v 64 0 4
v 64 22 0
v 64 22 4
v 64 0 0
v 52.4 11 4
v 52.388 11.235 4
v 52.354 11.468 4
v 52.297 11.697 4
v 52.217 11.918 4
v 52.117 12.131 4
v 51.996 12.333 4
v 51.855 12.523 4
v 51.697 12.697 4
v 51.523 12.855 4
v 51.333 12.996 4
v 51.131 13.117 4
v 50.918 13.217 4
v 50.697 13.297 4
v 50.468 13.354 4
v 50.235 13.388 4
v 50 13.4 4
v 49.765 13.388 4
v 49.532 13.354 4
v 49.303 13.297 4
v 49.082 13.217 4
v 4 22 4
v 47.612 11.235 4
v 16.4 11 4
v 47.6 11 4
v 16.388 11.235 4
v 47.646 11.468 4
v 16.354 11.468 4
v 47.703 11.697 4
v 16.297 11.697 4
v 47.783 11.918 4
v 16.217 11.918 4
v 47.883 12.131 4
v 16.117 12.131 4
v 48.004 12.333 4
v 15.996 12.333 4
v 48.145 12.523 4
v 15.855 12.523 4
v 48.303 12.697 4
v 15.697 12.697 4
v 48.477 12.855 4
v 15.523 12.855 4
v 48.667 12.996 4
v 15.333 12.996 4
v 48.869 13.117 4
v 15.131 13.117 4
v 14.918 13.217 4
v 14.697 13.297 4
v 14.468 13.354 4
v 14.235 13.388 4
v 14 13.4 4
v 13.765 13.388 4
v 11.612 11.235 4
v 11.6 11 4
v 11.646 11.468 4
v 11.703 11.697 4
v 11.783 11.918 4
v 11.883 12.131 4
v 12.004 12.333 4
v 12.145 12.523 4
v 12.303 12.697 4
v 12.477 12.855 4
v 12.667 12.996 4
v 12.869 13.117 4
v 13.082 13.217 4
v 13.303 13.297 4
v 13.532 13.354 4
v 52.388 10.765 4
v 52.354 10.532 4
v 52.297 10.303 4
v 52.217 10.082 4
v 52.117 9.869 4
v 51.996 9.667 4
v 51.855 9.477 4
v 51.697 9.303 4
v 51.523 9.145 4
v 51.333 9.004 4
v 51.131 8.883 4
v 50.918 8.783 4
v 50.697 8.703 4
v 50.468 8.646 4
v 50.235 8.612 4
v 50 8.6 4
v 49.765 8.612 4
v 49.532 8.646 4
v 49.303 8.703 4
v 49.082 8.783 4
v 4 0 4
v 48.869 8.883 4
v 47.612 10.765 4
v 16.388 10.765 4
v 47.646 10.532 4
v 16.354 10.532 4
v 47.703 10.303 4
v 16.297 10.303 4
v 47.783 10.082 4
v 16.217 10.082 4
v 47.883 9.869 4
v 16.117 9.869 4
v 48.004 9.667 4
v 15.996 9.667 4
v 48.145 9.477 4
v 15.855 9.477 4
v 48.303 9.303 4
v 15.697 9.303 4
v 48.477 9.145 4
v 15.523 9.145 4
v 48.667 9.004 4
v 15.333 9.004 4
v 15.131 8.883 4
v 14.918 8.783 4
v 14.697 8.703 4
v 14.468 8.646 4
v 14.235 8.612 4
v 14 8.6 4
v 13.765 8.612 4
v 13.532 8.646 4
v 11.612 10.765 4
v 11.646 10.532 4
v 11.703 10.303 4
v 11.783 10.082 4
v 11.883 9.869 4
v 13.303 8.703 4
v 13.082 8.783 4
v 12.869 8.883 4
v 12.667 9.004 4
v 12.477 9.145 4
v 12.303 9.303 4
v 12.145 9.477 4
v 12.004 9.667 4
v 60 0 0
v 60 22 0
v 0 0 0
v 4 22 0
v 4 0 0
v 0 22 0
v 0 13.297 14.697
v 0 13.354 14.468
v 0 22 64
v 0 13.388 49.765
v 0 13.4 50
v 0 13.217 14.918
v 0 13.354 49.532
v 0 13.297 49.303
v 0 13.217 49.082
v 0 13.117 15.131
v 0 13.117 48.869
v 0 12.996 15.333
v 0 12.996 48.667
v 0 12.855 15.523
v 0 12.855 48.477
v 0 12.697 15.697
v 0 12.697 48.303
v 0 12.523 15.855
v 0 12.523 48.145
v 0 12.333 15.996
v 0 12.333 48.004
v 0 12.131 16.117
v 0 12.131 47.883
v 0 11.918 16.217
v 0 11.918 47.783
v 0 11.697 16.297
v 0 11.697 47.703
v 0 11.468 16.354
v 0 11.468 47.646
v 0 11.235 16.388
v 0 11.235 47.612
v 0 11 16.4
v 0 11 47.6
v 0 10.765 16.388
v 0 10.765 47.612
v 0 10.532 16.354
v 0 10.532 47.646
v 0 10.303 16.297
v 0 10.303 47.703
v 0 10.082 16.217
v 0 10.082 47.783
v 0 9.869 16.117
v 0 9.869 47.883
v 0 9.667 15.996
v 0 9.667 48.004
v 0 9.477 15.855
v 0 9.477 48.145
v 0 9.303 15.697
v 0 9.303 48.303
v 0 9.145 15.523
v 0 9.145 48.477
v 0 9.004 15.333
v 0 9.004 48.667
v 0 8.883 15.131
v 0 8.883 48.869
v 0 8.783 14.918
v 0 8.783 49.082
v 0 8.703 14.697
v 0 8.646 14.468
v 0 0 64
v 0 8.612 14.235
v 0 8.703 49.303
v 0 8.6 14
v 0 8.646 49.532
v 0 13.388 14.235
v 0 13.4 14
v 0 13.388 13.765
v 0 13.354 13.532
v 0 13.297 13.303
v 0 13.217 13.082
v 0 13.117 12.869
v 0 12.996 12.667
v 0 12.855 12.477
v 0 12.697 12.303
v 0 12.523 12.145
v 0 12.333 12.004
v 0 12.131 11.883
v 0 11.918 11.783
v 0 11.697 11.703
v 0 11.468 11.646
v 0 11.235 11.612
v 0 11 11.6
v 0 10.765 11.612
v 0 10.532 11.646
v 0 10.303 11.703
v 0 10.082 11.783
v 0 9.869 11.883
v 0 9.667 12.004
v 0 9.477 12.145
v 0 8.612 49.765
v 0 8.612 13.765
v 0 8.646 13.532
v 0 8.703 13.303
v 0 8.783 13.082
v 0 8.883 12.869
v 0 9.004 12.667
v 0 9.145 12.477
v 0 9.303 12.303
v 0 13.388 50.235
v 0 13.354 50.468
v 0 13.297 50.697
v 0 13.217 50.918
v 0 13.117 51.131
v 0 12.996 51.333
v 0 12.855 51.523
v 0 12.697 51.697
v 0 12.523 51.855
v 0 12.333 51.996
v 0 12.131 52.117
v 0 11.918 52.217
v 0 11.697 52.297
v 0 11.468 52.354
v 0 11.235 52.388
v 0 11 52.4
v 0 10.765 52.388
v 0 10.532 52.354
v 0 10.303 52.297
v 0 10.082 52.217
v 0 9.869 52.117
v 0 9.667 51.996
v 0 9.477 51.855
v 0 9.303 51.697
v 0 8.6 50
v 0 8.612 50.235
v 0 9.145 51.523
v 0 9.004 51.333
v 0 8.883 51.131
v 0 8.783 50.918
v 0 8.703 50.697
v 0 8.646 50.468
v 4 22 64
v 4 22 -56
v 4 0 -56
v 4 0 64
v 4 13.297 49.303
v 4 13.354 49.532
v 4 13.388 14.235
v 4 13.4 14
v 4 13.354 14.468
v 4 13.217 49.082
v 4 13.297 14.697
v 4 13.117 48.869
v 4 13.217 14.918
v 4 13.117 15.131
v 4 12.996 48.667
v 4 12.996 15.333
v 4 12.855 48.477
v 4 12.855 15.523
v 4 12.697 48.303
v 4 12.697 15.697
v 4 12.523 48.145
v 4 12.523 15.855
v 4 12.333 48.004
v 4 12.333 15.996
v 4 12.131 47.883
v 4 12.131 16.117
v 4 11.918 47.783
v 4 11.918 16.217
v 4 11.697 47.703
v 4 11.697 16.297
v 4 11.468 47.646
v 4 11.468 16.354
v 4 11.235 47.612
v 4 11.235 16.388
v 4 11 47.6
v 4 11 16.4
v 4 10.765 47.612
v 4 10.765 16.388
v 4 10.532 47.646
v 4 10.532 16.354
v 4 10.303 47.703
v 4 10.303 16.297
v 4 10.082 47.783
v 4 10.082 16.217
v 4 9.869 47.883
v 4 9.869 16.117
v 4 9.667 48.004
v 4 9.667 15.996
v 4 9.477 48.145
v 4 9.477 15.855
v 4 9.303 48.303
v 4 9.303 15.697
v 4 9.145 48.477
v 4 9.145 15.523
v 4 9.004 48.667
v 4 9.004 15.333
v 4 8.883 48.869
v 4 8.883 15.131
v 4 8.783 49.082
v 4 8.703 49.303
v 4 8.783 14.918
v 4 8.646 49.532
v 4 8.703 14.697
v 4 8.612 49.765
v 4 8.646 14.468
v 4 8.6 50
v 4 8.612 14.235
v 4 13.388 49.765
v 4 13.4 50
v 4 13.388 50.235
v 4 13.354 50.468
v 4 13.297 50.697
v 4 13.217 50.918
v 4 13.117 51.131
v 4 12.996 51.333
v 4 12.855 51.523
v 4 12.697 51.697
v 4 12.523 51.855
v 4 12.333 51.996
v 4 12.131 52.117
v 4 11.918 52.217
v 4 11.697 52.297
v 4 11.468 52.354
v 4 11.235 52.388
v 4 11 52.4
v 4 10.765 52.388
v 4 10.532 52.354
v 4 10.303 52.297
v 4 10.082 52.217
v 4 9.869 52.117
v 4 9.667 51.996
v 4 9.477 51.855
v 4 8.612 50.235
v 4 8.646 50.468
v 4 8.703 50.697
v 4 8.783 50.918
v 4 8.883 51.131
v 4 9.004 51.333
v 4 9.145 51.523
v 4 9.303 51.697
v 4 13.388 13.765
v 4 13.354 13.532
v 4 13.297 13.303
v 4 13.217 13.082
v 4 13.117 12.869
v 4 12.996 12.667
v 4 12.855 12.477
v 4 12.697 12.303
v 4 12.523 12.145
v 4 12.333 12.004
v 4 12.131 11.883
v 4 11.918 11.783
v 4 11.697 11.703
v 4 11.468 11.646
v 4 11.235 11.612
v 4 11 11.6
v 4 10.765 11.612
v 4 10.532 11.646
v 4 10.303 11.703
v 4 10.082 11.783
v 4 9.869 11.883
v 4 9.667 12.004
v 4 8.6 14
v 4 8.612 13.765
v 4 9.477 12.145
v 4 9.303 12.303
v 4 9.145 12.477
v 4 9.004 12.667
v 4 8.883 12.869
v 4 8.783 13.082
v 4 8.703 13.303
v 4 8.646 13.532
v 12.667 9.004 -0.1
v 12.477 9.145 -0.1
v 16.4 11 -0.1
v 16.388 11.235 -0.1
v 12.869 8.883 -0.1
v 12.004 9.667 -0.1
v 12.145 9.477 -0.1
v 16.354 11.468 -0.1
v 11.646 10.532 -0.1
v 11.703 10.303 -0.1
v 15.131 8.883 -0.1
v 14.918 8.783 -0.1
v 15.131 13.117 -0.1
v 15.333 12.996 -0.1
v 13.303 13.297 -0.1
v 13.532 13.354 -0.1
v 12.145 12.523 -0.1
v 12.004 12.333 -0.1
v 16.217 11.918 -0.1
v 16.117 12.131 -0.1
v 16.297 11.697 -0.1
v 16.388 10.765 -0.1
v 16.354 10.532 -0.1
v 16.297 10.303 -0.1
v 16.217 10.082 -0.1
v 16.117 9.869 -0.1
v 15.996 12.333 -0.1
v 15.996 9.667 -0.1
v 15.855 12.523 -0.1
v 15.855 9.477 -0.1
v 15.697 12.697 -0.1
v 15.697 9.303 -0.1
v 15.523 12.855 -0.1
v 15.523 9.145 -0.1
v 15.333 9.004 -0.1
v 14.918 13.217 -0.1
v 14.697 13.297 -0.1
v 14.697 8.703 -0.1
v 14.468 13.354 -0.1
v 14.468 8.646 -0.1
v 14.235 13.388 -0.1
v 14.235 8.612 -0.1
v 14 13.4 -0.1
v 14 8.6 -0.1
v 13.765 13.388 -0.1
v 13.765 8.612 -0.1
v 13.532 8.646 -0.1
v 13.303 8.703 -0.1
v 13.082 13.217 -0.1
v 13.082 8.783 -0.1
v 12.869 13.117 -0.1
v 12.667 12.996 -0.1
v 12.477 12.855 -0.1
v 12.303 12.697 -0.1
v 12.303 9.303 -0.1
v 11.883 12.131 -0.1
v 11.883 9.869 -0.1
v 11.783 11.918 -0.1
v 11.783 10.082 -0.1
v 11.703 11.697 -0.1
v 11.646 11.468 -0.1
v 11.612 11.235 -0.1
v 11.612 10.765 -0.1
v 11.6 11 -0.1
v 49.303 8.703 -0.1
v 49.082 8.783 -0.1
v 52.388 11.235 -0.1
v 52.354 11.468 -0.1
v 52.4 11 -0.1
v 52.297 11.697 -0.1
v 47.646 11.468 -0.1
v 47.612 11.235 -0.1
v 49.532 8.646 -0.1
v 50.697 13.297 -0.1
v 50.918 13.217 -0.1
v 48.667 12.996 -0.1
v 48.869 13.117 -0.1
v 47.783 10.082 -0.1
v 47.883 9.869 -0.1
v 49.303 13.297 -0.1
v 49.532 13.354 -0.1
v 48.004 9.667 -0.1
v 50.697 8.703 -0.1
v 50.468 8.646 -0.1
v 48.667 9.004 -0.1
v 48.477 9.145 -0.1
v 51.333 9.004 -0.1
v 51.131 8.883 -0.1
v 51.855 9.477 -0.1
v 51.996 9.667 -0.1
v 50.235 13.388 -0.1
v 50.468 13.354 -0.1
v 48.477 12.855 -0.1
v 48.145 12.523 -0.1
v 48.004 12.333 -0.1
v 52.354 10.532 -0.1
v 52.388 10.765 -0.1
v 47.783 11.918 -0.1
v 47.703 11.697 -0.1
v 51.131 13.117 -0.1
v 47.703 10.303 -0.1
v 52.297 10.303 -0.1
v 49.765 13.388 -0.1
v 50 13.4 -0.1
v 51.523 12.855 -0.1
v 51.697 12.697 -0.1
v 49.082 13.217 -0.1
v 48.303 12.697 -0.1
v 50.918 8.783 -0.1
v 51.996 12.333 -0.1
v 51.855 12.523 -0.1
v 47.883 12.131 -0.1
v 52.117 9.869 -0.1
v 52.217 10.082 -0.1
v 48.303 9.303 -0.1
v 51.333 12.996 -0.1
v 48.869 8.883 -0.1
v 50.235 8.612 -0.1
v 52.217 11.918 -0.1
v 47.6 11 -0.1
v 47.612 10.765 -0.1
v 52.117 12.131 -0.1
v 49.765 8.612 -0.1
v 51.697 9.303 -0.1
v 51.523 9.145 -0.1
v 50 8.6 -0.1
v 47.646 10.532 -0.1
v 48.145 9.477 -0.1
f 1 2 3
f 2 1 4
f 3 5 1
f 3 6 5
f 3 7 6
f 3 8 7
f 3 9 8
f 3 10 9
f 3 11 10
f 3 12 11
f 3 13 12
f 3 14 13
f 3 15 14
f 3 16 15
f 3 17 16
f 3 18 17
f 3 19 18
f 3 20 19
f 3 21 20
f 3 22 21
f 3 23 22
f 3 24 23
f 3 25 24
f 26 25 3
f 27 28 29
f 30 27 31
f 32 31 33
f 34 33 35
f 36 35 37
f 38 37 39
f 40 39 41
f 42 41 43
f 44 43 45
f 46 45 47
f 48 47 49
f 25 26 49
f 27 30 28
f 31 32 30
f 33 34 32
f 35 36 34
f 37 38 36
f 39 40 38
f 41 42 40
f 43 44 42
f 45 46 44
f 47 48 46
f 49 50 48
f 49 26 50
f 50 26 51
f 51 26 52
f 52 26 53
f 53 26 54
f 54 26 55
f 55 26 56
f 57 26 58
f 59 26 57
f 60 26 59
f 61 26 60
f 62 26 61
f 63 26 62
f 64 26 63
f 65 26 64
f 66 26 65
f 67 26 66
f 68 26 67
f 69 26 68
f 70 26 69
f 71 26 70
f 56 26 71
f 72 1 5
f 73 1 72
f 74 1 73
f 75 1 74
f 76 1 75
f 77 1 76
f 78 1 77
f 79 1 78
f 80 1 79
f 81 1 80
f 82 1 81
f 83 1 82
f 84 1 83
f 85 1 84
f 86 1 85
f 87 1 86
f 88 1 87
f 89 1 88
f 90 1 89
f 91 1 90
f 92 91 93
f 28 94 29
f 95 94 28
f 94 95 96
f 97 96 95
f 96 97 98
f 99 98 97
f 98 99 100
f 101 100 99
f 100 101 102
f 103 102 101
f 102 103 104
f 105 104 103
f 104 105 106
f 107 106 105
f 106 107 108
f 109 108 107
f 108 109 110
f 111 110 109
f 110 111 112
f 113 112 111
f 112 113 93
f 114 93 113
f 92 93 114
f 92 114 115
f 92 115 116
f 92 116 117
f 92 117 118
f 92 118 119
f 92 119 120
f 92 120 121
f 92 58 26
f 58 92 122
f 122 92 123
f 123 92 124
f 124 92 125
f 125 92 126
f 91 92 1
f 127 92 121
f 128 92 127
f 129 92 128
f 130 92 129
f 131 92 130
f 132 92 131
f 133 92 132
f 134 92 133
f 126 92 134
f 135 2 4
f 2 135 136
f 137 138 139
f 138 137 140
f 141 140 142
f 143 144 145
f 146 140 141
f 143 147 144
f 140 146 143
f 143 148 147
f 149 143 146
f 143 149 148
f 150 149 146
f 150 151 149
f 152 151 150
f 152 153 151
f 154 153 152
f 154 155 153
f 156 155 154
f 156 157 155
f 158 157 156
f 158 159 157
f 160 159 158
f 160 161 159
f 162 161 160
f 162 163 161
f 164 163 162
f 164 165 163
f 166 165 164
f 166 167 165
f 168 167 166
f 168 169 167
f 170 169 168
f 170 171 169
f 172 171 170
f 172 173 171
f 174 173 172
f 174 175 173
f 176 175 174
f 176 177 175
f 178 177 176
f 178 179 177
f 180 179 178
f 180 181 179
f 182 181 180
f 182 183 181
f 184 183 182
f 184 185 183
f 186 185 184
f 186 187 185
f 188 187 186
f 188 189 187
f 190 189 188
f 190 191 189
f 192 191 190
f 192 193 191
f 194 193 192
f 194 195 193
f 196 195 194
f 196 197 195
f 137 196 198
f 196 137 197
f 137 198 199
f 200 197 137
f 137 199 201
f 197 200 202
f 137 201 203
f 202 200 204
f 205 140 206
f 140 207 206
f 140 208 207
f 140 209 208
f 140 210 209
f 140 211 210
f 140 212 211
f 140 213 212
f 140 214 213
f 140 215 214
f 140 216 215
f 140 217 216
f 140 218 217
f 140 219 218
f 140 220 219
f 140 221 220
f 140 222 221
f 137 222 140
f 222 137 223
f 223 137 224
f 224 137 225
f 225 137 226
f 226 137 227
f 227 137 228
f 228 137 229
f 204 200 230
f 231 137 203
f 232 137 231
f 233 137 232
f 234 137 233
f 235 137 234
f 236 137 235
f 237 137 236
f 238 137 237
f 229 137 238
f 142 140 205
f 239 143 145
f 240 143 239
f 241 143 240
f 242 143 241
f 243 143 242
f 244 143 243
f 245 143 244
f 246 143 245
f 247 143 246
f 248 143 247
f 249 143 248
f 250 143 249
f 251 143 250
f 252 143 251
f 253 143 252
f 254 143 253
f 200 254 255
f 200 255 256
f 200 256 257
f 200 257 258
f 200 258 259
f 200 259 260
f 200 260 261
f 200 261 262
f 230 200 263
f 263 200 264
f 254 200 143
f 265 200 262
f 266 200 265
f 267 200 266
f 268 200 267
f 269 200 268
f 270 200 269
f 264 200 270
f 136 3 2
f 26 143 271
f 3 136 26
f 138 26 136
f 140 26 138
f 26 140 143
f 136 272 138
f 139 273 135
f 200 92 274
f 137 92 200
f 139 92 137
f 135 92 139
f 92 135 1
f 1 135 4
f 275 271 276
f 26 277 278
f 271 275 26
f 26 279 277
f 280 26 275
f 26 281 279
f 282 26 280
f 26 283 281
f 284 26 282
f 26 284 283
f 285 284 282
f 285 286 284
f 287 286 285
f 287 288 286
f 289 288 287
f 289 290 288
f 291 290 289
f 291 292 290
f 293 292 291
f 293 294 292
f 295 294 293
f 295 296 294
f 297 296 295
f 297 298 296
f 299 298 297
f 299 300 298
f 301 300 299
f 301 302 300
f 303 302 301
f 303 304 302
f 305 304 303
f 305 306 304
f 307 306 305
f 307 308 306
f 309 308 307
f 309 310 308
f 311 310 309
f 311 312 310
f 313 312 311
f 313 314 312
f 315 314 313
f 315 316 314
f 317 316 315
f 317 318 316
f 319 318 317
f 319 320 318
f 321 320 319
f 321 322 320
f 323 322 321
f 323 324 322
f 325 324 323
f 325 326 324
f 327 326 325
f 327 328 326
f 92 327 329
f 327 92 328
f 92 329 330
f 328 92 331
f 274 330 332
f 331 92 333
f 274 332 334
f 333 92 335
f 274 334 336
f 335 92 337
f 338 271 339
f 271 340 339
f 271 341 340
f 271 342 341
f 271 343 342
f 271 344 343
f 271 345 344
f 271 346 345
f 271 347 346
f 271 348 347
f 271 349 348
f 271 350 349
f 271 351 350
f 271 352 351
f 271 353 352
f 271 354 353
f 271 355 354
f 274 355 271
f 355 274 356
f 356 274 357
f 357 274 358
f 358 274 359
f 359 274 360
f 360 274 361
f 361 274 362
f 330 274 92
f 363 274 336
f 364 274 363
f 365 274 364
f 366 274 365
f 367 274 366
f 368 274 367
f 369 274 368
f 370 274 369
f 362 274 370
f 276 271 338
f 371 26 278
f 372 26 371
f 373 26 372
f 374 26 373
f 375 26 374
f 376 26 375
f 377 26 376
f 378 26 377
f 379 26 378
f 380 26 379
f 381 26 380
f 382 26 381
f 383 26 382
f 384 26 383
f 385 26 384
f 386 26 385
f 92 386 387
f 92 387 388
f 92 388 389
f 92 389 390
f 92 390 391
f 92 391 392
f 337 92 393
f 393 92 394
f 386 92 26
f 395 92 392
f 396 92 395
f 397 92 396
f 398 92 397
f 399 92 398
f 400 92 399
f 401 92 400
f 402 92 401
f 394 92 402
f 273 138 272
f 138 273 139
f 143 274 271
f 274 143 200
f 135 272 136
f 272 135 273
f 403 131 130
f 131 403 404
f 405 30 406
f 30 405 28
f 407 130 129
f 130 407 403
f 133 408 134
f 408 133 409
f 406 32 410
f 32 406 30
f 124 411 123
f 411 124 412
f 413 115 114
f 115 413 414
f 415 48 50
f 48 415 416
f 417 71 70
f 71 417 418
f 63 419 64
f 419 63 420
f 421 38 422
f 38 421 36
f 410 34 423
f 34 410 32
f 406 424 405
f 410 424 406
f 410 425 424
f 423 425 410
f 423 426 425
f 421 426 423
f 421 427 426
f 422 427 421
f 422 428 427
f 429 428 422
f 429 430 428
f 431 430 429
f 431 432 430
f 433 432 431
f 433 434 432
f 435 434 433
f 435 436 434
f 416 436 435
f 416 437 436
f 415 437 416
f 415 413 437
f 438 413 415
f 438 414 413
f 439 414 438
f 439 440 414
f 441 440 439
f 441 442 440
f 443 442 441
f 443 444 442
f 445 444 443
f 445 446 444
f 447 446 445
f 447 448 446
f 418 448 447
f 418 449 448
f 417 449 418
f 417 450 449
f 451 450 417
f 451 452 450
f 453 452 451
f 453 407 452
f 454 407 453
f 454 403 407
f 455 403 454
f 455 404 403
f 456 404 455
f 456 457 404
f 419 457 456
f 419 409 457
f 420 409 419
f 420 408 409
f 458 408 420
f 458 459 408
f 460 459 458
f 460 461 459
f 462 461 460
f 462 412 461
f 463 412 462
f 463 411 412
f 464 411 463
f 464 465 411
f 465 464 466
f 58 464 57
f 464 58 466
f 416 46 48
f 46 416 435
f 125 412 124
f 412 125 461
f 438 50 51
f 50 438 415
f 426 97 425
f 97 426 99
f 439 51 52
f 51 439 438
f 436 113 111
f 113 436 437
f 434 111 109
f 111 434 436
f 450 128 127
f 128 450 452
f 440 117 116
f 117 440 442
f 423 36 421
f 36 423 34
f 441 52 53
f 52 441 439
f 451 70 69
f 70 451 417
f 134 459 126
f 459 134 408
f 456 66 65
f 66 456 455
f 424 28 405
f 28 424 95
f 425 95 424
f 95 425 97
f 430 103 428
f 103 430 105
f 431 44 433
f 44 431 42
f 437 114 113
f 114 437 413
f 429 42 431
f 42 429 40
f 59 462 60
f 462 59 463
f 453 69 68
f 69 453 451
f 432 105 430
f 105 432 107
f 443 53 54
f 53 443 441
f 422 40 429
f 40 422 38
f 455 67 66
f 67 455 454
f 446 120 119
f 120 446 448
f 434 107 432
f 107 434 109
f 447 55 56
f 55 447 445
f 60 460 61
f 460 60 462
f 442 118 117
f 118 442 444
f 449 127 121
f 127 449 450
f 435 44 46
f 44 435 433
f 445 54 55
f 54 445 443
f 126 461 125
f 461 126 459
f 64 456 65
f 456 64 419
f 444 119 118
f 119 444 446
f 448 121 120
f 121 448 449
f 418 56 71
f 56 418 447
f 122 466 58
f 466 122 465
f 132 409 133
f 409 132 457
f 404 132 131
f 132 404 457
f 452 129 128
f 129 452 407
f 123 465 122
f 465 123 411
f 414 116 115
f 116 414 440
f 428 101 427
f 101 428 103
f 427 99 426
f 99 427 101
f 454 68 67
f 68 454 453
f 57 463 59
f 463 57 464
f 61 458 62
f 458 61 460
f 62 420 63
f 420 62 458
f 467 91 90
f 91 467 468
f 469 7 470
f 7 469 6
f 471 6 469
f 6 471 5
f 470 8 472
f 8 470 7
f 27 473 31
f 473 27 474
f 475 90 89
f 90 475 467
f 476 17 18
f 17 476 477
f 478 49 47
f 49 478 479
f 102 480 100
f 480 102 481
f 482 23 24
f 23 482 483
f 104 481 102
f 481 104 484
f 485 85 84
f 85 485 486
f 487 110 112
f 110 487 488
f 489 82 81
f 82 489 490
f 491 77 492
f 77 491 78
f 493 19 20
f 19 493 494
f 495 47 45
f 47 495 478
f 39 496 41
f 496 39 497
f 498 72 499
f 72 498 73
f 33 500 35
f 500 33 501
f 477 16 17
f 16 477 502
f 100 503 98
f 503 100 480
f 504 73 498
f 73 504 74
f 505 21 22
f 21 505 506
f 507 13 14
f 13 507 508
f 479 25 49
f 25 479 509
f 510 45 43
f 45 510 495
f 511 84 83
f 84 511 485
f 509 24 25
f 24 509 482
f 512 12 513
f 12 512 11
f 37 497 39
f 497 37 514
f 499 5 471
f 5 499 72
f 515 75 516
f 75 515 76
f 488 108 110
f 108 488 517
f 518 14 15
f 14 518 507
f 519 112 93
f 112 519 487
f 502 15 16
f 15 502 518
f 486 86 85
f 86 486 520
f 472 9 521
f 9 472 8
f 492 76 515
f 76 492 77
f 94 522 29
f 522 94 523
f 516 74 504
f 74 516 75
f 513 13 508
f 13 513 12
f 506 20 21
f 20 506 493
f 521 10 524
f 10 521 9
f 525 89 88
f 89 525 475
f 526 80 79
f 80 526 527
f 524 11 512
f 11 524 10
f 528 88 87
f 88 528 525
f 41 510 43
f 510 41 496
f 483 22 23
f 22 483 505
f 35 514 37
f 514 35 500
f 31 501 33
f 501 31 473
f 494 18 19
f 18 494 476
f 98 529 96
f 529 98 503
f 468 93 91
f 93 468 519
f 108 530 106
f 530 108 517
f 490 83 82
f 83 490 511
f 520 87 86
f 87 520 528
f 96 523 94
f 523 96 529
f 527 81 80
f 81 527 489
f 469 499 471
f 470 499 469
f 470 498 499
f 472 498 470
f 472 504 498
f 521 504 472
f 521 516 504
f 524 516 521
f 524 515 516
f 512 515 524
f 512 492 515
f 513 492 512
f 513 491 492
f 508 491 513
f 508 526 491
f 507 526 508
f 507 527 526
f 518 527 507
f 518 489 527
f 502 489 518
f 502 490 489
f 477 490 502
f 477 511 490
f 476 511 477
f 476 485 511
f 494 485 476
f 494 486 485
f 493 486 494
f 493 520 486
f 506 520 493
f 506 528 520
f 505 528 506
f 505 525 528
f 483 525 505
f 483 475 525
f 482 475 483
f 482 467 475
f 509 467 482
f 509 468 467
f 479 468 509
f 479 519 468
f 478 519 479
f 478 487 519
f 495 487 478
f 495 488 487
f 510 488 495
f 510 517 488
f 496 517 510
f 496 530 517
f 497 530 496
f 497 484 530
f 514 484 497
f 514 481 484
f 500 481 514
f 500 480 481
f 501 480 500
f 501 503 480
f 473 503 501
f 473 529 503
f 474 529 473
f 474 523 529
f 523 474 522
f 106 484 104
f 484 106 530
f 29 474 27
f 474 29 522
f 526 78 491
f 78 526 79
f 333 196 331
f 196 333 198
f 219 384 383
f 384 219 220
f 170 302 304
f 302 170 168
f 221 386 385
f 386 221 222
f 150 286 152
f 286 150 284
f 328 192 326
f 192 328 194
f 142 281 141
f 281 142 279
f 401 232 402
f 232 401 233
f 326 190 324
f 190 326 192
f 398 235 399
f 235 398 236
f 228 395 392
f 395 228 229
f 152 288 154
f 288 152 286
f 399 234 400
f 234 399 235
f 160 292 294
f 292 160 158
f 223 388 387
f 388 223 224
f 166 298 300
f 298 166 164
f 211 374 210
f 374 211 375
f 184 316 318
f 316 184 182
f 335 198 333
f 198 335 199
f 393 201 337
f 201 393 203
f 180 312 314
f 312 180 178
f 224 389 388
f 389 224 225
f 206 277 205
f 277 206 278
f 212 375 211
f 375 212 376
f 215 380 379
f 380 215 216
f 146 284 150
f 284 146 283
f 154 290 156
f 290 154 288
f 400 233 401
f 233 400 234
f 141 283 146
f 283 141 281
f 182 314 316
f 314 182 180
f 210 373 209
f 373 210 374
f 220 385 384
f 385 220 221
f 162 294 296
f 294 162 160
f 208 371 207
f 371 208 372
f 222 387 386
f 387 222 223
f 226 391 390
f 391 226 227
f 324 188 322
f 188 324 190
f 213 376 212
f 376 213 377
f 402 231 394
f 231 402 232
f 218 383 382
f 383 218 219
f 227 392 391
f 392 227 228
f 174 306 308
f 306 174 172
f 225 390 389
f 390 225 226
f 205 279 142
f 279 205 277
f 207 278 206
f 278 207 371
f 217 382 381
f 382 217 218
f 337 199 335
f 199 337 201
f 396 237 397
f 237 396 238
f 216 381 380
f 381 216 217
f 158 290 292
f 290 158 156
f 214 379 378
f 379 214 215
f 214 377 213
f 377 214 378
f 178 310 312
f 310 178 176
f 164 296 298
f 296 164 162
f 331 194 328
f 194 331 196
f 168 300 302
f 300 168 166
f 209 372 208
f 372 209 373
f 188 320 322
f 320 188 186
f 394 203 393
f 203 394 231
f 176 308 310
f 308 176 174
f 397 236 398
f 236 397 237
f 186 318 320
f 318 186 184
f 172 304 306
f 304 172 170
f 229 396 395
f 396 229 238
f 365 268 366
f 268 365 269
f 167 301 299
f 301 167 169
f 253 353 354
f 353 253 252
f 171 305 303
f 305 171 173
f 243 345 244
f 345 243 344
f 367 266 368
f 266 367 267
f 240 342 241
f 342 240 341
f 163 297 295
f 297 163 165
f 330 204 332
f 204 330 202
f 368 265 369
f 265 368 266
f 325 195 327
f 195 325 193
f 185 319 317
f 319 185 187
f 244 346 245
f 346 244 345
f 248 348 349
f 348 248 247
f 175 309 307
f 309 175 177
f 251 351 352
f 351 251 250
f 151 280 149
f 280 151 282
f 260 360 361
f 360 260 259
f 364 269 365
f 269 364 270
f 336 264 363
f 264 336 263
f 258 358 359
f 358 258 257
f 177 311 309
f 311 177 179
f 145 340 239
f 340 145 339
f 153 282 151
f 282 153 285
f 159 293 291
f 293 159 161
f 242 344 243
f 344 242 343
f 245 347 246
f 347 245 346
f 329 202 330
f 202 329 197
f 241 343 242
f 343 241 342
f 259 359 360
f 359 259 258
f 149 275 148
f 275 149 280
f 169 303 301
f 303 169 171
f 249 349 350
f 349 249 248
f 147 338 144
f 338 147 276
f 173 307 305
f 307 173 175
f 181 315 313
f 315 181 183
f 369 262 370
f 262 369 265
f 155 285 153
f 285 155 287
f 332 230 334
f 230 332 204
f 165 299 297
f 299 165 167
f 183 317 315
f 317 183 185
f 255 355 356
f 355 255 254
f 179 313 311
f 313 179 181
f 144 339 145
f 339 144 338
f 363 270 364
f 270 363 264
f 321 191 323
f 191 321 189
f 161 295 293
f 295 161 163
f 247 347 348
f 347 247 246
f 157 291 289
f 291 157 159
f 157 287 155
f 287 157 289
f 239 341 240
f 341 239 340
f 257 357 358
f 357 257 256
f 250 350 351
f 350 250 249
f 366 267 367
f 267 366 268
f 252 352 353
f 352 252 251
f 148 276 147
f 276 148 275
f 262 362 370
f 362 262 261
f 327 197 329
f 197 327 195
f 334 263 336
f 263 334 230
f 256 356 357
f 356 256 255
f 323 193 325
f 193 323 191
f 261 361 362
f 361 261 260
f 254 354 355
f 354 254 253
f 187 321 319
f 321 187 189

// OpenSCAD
// Angle Bracket
leg_length = 64;
bracket_width = 22;
thickness = 4;
gusset_thickness = 5;
hole_diameter = 4.8;
hole_margin = 14;

$fn = $preview ? 32 : 64;

module gusset_profile() {
  polygon(points = [
    [0, 0],
    [leg_length - thickness, 0],
    [0, leg_length - thickness]
  ]);
}

difference() {
  union() {
    translate([leg_length / 2, bracket_width / 2, thickness / 2]) {
      cube([leg_length, bracket_width, thickness], center = true);
    }

    translate([thickness / 2, bracket_width / 2, leg_length / 2]) {
      cube([thickness, bracket_width, leg_length], center = true);
    }

    translate([thickness, 0, thickness]) {
      rotate([-90, 0, 0]) linear_extrude(height = bracket_width) gusset_profile();
    }
  }

  translate([hole_margin, bracket_width / 2, -0.1]) {
    cylinder(h = thickness + 0.2, d = hole_diameter);
  }

  translate([leg_length - hole_margin, bracket_width / 2, -0.1]) {
    cylinder(h = thickness + 0.2, d = hole_diameter);
  }

  translate([-0.1, bracket_width / 2, hole_margin]) {
    rotate([0, 90, 0]) cylinder(h = thickness + 0.2, d = hole_diameter);
  }

  translate([-0.1, bracket_width / 2, leg_length - hole_margin]) {
    rotate([0, 90, 0]) cylinder(h = thickness + 0.2, d = hole_diameter);
  }
}
